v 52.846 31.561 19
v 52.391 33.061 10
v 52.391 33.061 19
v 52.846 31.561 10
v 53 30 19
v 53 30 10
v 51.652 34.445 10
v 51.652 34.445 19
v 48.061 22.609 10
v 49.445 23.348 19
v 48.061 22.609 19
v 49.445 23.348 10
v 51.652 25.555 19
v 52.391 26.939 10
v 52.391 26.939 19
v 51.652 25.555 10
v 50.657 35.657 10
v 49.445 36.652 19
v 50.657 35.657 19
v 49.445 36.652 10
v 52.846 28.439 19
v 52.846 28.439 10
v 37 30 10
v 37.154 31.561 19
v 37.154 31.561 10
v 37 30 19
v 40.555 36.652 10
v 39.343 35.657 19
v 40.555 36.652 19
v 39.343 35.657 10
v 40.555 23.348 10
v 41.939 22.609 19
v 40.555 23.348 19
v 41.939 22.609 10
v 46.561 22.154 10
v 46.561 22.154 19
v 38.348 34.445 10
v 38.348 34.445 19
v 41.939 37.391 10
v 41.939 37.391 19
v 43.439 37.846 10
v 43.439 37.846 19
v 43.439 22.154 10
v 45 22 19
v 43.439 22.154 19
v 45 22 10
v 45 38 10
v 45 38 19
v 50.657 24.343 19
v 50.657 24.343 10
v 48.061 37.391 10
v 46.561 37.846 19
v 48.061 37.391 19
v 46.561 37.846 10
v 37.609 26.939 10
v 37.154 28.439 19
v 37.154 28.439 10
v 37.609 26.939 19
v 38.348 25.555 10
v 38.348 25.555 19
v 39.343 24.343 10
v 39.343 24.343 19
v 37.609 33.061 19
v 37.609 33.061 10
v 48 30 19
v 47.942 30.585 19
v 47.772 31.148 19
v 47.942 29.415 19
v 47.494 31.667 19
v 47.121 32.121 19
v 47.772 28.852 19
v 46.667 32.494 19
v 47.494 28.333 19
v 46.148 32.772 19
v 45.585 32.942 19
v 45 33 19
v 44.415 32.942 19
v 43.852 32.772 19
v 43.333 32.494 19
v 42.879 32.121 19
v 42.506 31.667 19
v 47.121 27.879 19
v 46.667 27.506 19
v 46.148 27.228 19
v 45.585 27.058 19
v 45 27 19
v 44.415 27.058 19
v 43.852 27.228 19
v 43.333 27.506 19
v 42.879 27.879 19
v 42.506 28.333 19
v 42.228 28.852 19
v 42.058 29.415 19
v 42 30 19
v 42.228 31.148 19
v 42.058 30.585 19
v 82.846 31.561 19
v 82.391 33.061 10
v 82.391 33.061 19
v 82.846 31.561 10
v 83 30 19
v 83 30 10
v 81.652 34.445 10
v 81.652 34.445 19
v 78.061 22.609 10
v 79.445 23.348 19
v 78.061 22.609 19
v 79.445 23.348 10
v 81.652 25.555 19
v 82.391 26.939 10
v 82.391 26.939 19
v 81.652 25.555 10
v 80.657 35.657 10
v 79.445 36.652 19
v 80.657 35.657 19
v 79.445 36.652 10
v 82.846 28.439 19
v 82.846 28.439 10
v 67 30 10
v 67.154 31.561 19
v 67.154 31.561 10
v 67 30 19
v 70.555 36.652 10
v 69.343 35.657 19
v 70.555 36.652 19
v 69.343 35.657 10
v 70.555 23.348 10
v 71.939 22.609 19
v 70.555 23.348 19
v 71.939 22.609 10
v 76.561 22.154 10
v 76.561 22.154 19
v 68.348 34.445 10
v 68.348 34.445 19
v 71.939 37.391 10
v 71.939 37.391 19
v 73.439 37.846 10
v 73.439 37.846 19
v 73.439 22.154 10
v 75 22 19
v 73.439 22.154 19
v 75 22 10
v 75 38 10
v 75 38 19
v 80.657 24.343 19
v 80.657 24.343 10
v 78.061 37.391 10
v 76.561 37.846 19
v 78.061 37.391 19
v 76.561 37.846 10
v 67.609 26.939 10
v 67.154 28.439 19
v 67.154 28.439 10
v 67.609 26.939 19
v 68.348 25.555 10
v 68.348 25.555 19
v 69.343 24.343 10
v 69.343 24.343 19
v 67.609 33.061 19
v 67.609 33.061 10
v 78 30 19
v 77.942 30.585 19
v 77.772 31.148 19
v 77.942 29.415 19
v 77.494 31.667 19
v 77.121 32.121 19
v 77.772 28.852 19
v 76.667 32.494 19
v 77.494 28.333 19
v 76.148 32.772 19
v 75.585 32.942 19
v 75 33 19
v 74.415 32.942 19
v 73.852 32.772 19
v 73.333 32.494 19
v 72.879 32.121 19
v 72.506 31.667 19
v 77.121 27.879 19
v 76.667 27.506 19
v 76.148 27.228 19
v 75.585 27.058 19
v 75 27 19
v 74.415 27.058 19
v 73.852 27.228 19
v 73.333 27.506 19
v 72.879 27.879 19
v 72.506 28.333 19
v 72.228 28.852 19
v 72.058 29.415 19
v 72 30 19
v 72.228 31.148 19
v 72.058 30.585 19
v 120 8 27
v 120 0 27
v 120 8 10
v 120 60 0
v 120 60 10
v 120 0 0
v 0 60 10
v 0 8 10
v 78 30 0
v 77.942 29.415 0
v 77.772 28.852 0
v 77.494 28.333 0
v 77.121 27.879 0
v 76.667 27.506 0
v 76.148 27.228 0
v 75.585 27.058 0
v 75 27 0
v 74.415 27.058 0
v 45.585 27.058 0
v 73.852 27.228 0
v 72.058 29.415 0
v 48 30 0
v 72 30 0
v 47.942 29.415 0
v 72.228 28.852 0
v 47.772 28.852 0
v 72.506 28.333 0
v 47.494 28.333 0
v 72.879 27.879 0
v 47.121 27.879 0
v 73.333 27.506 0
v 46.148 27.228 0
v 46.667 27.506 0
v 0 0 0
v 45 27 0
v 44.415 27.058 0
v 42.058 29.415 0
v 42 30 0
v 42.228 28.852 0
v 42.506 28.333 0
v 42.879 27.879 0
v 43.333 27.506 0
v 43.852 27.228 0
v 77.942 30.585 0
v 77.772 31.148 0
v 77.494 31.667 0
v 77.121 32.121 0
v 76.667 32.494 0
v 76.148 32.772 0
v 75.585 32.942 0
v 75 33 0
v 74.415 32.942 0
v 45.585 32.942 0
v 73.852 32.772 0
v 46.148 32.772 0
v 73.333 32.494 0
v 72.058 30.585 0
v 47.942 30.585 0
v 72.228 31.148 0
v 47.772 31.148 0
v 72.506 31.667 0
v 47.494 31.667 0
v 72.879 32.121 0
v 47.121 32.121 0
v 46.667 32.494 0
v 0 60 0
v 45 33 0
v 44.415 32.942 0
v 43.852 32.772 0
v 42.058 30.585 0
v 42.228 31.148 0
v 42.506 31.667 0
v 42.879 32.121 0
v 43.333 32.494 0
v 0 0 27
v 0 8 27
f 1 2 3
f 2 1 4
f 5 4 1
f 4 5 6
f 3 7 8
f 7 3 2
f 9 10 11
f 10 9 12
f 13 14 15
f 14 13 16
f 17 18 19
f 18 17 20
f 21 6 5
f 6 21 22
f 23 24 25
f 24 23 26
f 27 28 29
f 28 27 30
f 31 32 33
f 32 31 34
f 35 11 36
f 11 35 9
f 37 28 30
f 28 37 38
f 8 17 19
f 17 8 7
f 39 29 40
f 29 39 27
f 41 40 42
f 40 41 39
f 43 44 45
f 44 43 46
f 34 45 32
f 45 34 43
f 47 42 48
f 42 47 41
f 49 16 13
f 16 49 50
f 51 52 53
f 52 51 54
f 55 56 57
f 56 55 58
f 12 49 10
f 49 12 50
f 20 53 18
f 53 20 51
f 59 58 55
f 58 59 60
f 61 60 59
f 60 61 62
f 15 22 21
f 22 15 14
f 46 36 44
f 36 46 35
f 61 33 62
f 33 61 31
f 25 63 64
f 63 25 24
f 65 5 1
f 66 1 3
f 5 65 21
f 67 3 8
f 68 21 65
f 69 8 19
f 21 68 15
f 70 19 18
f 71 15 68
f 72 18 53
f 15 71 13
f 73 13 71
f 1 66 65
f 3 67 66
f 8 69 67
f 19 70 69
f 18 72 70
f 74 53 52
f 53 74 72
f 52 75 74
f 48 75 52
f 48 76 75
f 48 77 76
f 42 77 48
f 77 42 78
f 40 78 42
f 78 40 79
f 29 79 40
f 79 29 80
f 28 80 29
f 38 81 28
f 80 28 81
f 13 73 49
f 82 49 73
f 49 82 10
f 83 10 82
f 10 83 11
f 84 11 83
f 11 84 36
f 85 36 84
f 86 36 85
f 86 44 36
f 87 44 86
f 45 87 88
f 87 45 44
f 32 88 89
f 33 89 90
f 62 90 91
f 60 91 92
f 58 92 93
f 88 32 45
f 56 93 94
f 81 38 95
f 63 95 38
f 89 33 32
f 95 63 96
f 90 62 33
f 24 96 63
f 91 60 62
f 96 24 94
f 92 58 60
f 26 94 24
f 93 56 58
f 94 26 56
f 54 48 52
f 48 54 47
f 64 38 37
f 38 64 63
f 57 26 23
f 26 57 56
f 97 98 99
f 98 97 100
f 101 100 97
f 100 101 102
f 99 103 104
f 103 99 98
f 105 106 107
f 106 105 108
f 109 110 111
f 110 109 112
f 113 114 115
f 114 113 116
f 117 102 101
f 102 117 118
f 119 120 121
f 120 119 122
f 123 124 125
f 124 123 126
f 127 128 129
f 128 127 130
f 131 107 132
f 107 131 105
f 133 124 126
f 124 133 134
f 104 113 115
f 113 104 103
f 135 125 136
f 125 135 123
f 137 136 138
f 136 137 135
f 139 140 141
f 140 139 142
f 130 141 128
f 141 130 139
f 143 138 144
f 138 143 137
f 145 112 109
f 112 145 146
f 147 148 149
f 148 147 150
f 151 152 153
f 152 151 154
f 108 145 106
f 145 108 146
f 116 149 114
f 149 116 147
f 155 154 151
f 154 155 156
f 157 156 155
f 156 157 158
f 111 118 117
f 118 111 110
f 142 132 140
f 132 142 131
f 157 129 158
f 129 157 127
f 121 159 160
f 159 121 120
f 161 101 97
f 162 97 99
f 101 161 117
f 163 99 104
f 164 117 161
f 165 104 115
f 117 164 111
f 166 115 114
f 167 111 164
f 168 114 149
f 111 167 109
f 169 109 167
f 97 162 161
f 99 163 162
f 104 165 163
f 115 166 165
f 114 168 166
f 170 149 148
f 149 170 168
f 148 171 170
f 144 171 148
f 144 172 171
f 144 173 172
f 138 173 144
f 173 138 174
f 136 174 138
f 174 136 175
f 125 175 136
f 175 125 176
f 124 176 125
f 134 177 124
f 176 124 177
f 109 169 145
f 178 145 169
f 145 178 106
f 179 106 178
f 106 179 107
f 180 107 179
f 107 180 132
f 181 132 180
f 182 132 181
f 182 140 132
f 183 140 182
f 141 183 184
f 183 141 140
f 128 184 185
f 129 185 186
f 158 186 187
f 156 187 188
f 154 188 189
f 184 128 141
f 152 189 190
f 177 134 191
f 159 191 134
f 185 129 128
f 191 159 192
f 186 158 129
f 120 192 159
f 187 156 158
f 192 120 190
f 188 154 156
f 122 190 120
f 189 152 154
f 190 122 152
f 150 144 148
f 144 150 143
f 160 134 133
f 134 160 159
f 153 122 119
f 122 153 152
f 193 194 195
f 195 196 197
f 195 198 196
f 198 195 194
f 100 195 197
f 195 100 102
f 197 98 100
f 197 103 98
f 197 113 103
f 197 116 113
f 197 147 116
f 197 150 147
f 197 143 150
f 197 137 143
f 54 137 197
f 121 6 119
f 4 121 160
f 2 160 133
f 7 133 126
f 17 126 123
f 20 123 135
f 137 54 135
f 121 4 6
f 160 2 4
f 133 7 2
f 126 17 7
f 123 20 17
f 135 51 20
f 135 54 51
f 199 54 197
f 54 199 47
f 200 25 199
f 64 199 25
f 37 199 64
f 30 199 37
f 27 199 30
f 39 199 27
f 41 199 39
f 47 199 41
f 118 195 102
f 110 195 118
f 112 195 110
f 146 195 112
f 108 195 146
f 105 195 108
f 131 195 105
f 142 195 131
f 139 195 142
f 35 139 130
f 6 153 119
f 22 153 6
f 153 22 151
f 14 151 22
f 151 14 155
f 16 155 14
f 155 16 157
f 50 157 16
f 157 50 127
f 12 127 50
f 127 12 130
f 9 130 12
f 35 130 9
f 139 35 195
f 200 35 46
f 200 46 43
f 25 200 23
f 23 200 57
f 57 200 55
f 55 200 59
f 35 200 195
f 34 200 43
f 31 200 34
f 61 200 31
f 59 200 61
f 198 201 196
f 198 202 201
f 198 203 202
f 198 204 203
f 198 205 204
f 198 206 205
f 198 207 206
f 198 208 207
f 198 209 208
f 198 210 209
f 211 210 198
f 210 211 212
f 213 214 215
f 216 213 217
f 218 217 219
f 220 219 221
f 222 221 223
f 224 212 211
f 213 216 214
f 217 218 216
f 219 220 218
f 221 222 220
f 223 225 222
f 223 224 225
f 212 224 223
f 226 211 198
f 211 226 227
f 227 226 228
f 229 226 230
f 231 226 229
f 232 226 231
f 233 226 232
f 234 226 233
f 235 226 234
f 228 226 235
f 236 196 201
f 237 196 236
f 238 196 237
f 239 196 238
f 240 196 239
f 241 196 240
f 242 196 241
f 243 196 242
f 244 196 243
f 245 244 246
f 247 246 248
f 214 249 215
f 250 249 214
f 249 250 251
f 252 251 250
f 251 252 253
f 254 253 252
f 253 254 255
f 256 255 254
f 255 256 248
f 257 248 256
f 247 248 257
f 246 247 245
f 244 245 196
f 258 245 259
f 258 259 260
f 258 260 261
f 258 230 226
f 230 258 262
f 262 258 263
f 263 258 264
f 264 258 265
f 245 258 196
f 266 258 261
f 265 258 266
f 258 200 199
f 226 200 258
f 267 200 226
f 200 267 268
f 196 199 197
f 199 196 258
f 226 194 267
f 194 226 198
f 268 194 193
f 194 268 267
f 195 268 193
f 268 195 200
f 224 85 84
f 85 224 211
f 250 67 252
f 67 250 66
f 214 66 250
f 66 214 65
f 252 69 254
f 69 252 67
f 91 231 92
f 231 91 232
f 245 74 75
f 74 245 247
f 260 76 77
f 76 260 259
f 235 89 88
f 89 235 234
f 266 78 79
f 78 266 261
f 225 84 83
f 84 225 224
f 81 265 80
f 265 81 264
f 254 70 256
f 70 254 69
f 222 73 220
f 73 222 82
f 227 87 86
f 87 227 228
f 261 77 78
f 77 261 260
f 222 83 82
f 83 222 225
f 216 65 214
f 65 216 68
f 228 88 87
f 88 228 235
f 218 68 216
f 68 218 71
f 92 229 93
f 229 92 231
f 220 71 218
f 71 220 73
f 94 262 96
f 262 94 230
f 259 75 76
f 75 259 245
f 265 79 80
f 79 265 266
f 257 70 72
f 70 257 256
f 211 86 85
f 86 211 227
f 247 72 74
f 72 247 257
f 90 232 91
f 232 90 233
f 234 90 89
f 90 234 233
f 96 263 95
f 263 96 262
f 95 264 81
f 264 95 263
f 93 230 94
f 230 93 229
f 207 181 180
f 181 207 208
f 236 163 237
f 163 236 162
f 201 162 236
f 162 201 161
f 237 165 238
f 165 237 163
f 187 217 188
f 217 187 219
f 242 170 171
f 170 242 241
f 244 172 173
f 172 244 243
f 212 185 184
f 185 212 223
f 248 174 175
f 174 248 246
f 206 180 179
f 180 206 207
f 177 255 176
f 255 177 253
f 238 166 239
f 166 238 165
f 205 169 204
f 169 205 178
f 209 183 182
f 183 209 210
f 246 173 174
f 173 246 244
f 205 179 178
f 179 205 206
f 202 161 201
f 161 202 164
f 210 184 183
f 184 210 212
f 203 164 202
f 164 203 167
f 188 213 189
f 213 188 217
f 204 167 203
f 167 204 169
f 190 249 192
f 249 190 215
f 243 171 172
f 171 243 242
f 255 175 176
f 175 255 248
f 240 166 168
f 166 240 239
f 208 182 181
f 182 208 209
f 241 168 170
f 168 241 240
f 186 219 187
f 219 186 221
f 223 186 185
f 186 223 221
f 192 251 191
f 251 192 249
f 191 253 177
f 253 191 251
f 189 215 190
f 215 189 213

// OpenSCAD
$fn = 32;

// ----------------------------------------------------------------------
// Drill jig: fence jig
// ----------------------------------------------------------------------

// --- parameters (mm) ---
plate_l = 120;            // plate length, X
plate_w = 60;             // plate width, Y
plate_t = 10;             // plate thickness
boss_d = 16;              // guide boss diameter
boss_h = 10;              // boss height above the plate
guide_d = 6;              // guide hole diameter
boss_pitch = 30;          // boss pitch
fence_h = 18;             // fence height above the plate
fence_t = 8;              // fence thickness

n_boss = 2;  // guide bosses
boss_x0 = (plate_l - (n_boss - 1) * boss_pitch) / 2;  // first boss X
boss_top = plate_t - 1 + boss_h;  // boss crown height
fence_top = plate_t - 1 + fence_h;  // fence crown height
total_h = max([fence_top, boss_top]);  // overall height

difference() {
  union() {
  cube([plate_l, plate_w, plate_t]);
  for (i = [0 : n_boss - 1])
    translate([boss_x0 + i * boss_pitch, plate_w / 2, plate_t - 1])
      cylinder(h = boss_h, d = boss_d);
  translate([0, 0, plate_t - 1]) cube([plate_l, fence_t, fence_h]);
  }
  for (i = [0 : n_boss - 1])
    translate([boss_x0 + i * boss_pitch, plate_w / 2, -1])
      cylinder(h = plate_t + boss_h, d = guide_d);
}
